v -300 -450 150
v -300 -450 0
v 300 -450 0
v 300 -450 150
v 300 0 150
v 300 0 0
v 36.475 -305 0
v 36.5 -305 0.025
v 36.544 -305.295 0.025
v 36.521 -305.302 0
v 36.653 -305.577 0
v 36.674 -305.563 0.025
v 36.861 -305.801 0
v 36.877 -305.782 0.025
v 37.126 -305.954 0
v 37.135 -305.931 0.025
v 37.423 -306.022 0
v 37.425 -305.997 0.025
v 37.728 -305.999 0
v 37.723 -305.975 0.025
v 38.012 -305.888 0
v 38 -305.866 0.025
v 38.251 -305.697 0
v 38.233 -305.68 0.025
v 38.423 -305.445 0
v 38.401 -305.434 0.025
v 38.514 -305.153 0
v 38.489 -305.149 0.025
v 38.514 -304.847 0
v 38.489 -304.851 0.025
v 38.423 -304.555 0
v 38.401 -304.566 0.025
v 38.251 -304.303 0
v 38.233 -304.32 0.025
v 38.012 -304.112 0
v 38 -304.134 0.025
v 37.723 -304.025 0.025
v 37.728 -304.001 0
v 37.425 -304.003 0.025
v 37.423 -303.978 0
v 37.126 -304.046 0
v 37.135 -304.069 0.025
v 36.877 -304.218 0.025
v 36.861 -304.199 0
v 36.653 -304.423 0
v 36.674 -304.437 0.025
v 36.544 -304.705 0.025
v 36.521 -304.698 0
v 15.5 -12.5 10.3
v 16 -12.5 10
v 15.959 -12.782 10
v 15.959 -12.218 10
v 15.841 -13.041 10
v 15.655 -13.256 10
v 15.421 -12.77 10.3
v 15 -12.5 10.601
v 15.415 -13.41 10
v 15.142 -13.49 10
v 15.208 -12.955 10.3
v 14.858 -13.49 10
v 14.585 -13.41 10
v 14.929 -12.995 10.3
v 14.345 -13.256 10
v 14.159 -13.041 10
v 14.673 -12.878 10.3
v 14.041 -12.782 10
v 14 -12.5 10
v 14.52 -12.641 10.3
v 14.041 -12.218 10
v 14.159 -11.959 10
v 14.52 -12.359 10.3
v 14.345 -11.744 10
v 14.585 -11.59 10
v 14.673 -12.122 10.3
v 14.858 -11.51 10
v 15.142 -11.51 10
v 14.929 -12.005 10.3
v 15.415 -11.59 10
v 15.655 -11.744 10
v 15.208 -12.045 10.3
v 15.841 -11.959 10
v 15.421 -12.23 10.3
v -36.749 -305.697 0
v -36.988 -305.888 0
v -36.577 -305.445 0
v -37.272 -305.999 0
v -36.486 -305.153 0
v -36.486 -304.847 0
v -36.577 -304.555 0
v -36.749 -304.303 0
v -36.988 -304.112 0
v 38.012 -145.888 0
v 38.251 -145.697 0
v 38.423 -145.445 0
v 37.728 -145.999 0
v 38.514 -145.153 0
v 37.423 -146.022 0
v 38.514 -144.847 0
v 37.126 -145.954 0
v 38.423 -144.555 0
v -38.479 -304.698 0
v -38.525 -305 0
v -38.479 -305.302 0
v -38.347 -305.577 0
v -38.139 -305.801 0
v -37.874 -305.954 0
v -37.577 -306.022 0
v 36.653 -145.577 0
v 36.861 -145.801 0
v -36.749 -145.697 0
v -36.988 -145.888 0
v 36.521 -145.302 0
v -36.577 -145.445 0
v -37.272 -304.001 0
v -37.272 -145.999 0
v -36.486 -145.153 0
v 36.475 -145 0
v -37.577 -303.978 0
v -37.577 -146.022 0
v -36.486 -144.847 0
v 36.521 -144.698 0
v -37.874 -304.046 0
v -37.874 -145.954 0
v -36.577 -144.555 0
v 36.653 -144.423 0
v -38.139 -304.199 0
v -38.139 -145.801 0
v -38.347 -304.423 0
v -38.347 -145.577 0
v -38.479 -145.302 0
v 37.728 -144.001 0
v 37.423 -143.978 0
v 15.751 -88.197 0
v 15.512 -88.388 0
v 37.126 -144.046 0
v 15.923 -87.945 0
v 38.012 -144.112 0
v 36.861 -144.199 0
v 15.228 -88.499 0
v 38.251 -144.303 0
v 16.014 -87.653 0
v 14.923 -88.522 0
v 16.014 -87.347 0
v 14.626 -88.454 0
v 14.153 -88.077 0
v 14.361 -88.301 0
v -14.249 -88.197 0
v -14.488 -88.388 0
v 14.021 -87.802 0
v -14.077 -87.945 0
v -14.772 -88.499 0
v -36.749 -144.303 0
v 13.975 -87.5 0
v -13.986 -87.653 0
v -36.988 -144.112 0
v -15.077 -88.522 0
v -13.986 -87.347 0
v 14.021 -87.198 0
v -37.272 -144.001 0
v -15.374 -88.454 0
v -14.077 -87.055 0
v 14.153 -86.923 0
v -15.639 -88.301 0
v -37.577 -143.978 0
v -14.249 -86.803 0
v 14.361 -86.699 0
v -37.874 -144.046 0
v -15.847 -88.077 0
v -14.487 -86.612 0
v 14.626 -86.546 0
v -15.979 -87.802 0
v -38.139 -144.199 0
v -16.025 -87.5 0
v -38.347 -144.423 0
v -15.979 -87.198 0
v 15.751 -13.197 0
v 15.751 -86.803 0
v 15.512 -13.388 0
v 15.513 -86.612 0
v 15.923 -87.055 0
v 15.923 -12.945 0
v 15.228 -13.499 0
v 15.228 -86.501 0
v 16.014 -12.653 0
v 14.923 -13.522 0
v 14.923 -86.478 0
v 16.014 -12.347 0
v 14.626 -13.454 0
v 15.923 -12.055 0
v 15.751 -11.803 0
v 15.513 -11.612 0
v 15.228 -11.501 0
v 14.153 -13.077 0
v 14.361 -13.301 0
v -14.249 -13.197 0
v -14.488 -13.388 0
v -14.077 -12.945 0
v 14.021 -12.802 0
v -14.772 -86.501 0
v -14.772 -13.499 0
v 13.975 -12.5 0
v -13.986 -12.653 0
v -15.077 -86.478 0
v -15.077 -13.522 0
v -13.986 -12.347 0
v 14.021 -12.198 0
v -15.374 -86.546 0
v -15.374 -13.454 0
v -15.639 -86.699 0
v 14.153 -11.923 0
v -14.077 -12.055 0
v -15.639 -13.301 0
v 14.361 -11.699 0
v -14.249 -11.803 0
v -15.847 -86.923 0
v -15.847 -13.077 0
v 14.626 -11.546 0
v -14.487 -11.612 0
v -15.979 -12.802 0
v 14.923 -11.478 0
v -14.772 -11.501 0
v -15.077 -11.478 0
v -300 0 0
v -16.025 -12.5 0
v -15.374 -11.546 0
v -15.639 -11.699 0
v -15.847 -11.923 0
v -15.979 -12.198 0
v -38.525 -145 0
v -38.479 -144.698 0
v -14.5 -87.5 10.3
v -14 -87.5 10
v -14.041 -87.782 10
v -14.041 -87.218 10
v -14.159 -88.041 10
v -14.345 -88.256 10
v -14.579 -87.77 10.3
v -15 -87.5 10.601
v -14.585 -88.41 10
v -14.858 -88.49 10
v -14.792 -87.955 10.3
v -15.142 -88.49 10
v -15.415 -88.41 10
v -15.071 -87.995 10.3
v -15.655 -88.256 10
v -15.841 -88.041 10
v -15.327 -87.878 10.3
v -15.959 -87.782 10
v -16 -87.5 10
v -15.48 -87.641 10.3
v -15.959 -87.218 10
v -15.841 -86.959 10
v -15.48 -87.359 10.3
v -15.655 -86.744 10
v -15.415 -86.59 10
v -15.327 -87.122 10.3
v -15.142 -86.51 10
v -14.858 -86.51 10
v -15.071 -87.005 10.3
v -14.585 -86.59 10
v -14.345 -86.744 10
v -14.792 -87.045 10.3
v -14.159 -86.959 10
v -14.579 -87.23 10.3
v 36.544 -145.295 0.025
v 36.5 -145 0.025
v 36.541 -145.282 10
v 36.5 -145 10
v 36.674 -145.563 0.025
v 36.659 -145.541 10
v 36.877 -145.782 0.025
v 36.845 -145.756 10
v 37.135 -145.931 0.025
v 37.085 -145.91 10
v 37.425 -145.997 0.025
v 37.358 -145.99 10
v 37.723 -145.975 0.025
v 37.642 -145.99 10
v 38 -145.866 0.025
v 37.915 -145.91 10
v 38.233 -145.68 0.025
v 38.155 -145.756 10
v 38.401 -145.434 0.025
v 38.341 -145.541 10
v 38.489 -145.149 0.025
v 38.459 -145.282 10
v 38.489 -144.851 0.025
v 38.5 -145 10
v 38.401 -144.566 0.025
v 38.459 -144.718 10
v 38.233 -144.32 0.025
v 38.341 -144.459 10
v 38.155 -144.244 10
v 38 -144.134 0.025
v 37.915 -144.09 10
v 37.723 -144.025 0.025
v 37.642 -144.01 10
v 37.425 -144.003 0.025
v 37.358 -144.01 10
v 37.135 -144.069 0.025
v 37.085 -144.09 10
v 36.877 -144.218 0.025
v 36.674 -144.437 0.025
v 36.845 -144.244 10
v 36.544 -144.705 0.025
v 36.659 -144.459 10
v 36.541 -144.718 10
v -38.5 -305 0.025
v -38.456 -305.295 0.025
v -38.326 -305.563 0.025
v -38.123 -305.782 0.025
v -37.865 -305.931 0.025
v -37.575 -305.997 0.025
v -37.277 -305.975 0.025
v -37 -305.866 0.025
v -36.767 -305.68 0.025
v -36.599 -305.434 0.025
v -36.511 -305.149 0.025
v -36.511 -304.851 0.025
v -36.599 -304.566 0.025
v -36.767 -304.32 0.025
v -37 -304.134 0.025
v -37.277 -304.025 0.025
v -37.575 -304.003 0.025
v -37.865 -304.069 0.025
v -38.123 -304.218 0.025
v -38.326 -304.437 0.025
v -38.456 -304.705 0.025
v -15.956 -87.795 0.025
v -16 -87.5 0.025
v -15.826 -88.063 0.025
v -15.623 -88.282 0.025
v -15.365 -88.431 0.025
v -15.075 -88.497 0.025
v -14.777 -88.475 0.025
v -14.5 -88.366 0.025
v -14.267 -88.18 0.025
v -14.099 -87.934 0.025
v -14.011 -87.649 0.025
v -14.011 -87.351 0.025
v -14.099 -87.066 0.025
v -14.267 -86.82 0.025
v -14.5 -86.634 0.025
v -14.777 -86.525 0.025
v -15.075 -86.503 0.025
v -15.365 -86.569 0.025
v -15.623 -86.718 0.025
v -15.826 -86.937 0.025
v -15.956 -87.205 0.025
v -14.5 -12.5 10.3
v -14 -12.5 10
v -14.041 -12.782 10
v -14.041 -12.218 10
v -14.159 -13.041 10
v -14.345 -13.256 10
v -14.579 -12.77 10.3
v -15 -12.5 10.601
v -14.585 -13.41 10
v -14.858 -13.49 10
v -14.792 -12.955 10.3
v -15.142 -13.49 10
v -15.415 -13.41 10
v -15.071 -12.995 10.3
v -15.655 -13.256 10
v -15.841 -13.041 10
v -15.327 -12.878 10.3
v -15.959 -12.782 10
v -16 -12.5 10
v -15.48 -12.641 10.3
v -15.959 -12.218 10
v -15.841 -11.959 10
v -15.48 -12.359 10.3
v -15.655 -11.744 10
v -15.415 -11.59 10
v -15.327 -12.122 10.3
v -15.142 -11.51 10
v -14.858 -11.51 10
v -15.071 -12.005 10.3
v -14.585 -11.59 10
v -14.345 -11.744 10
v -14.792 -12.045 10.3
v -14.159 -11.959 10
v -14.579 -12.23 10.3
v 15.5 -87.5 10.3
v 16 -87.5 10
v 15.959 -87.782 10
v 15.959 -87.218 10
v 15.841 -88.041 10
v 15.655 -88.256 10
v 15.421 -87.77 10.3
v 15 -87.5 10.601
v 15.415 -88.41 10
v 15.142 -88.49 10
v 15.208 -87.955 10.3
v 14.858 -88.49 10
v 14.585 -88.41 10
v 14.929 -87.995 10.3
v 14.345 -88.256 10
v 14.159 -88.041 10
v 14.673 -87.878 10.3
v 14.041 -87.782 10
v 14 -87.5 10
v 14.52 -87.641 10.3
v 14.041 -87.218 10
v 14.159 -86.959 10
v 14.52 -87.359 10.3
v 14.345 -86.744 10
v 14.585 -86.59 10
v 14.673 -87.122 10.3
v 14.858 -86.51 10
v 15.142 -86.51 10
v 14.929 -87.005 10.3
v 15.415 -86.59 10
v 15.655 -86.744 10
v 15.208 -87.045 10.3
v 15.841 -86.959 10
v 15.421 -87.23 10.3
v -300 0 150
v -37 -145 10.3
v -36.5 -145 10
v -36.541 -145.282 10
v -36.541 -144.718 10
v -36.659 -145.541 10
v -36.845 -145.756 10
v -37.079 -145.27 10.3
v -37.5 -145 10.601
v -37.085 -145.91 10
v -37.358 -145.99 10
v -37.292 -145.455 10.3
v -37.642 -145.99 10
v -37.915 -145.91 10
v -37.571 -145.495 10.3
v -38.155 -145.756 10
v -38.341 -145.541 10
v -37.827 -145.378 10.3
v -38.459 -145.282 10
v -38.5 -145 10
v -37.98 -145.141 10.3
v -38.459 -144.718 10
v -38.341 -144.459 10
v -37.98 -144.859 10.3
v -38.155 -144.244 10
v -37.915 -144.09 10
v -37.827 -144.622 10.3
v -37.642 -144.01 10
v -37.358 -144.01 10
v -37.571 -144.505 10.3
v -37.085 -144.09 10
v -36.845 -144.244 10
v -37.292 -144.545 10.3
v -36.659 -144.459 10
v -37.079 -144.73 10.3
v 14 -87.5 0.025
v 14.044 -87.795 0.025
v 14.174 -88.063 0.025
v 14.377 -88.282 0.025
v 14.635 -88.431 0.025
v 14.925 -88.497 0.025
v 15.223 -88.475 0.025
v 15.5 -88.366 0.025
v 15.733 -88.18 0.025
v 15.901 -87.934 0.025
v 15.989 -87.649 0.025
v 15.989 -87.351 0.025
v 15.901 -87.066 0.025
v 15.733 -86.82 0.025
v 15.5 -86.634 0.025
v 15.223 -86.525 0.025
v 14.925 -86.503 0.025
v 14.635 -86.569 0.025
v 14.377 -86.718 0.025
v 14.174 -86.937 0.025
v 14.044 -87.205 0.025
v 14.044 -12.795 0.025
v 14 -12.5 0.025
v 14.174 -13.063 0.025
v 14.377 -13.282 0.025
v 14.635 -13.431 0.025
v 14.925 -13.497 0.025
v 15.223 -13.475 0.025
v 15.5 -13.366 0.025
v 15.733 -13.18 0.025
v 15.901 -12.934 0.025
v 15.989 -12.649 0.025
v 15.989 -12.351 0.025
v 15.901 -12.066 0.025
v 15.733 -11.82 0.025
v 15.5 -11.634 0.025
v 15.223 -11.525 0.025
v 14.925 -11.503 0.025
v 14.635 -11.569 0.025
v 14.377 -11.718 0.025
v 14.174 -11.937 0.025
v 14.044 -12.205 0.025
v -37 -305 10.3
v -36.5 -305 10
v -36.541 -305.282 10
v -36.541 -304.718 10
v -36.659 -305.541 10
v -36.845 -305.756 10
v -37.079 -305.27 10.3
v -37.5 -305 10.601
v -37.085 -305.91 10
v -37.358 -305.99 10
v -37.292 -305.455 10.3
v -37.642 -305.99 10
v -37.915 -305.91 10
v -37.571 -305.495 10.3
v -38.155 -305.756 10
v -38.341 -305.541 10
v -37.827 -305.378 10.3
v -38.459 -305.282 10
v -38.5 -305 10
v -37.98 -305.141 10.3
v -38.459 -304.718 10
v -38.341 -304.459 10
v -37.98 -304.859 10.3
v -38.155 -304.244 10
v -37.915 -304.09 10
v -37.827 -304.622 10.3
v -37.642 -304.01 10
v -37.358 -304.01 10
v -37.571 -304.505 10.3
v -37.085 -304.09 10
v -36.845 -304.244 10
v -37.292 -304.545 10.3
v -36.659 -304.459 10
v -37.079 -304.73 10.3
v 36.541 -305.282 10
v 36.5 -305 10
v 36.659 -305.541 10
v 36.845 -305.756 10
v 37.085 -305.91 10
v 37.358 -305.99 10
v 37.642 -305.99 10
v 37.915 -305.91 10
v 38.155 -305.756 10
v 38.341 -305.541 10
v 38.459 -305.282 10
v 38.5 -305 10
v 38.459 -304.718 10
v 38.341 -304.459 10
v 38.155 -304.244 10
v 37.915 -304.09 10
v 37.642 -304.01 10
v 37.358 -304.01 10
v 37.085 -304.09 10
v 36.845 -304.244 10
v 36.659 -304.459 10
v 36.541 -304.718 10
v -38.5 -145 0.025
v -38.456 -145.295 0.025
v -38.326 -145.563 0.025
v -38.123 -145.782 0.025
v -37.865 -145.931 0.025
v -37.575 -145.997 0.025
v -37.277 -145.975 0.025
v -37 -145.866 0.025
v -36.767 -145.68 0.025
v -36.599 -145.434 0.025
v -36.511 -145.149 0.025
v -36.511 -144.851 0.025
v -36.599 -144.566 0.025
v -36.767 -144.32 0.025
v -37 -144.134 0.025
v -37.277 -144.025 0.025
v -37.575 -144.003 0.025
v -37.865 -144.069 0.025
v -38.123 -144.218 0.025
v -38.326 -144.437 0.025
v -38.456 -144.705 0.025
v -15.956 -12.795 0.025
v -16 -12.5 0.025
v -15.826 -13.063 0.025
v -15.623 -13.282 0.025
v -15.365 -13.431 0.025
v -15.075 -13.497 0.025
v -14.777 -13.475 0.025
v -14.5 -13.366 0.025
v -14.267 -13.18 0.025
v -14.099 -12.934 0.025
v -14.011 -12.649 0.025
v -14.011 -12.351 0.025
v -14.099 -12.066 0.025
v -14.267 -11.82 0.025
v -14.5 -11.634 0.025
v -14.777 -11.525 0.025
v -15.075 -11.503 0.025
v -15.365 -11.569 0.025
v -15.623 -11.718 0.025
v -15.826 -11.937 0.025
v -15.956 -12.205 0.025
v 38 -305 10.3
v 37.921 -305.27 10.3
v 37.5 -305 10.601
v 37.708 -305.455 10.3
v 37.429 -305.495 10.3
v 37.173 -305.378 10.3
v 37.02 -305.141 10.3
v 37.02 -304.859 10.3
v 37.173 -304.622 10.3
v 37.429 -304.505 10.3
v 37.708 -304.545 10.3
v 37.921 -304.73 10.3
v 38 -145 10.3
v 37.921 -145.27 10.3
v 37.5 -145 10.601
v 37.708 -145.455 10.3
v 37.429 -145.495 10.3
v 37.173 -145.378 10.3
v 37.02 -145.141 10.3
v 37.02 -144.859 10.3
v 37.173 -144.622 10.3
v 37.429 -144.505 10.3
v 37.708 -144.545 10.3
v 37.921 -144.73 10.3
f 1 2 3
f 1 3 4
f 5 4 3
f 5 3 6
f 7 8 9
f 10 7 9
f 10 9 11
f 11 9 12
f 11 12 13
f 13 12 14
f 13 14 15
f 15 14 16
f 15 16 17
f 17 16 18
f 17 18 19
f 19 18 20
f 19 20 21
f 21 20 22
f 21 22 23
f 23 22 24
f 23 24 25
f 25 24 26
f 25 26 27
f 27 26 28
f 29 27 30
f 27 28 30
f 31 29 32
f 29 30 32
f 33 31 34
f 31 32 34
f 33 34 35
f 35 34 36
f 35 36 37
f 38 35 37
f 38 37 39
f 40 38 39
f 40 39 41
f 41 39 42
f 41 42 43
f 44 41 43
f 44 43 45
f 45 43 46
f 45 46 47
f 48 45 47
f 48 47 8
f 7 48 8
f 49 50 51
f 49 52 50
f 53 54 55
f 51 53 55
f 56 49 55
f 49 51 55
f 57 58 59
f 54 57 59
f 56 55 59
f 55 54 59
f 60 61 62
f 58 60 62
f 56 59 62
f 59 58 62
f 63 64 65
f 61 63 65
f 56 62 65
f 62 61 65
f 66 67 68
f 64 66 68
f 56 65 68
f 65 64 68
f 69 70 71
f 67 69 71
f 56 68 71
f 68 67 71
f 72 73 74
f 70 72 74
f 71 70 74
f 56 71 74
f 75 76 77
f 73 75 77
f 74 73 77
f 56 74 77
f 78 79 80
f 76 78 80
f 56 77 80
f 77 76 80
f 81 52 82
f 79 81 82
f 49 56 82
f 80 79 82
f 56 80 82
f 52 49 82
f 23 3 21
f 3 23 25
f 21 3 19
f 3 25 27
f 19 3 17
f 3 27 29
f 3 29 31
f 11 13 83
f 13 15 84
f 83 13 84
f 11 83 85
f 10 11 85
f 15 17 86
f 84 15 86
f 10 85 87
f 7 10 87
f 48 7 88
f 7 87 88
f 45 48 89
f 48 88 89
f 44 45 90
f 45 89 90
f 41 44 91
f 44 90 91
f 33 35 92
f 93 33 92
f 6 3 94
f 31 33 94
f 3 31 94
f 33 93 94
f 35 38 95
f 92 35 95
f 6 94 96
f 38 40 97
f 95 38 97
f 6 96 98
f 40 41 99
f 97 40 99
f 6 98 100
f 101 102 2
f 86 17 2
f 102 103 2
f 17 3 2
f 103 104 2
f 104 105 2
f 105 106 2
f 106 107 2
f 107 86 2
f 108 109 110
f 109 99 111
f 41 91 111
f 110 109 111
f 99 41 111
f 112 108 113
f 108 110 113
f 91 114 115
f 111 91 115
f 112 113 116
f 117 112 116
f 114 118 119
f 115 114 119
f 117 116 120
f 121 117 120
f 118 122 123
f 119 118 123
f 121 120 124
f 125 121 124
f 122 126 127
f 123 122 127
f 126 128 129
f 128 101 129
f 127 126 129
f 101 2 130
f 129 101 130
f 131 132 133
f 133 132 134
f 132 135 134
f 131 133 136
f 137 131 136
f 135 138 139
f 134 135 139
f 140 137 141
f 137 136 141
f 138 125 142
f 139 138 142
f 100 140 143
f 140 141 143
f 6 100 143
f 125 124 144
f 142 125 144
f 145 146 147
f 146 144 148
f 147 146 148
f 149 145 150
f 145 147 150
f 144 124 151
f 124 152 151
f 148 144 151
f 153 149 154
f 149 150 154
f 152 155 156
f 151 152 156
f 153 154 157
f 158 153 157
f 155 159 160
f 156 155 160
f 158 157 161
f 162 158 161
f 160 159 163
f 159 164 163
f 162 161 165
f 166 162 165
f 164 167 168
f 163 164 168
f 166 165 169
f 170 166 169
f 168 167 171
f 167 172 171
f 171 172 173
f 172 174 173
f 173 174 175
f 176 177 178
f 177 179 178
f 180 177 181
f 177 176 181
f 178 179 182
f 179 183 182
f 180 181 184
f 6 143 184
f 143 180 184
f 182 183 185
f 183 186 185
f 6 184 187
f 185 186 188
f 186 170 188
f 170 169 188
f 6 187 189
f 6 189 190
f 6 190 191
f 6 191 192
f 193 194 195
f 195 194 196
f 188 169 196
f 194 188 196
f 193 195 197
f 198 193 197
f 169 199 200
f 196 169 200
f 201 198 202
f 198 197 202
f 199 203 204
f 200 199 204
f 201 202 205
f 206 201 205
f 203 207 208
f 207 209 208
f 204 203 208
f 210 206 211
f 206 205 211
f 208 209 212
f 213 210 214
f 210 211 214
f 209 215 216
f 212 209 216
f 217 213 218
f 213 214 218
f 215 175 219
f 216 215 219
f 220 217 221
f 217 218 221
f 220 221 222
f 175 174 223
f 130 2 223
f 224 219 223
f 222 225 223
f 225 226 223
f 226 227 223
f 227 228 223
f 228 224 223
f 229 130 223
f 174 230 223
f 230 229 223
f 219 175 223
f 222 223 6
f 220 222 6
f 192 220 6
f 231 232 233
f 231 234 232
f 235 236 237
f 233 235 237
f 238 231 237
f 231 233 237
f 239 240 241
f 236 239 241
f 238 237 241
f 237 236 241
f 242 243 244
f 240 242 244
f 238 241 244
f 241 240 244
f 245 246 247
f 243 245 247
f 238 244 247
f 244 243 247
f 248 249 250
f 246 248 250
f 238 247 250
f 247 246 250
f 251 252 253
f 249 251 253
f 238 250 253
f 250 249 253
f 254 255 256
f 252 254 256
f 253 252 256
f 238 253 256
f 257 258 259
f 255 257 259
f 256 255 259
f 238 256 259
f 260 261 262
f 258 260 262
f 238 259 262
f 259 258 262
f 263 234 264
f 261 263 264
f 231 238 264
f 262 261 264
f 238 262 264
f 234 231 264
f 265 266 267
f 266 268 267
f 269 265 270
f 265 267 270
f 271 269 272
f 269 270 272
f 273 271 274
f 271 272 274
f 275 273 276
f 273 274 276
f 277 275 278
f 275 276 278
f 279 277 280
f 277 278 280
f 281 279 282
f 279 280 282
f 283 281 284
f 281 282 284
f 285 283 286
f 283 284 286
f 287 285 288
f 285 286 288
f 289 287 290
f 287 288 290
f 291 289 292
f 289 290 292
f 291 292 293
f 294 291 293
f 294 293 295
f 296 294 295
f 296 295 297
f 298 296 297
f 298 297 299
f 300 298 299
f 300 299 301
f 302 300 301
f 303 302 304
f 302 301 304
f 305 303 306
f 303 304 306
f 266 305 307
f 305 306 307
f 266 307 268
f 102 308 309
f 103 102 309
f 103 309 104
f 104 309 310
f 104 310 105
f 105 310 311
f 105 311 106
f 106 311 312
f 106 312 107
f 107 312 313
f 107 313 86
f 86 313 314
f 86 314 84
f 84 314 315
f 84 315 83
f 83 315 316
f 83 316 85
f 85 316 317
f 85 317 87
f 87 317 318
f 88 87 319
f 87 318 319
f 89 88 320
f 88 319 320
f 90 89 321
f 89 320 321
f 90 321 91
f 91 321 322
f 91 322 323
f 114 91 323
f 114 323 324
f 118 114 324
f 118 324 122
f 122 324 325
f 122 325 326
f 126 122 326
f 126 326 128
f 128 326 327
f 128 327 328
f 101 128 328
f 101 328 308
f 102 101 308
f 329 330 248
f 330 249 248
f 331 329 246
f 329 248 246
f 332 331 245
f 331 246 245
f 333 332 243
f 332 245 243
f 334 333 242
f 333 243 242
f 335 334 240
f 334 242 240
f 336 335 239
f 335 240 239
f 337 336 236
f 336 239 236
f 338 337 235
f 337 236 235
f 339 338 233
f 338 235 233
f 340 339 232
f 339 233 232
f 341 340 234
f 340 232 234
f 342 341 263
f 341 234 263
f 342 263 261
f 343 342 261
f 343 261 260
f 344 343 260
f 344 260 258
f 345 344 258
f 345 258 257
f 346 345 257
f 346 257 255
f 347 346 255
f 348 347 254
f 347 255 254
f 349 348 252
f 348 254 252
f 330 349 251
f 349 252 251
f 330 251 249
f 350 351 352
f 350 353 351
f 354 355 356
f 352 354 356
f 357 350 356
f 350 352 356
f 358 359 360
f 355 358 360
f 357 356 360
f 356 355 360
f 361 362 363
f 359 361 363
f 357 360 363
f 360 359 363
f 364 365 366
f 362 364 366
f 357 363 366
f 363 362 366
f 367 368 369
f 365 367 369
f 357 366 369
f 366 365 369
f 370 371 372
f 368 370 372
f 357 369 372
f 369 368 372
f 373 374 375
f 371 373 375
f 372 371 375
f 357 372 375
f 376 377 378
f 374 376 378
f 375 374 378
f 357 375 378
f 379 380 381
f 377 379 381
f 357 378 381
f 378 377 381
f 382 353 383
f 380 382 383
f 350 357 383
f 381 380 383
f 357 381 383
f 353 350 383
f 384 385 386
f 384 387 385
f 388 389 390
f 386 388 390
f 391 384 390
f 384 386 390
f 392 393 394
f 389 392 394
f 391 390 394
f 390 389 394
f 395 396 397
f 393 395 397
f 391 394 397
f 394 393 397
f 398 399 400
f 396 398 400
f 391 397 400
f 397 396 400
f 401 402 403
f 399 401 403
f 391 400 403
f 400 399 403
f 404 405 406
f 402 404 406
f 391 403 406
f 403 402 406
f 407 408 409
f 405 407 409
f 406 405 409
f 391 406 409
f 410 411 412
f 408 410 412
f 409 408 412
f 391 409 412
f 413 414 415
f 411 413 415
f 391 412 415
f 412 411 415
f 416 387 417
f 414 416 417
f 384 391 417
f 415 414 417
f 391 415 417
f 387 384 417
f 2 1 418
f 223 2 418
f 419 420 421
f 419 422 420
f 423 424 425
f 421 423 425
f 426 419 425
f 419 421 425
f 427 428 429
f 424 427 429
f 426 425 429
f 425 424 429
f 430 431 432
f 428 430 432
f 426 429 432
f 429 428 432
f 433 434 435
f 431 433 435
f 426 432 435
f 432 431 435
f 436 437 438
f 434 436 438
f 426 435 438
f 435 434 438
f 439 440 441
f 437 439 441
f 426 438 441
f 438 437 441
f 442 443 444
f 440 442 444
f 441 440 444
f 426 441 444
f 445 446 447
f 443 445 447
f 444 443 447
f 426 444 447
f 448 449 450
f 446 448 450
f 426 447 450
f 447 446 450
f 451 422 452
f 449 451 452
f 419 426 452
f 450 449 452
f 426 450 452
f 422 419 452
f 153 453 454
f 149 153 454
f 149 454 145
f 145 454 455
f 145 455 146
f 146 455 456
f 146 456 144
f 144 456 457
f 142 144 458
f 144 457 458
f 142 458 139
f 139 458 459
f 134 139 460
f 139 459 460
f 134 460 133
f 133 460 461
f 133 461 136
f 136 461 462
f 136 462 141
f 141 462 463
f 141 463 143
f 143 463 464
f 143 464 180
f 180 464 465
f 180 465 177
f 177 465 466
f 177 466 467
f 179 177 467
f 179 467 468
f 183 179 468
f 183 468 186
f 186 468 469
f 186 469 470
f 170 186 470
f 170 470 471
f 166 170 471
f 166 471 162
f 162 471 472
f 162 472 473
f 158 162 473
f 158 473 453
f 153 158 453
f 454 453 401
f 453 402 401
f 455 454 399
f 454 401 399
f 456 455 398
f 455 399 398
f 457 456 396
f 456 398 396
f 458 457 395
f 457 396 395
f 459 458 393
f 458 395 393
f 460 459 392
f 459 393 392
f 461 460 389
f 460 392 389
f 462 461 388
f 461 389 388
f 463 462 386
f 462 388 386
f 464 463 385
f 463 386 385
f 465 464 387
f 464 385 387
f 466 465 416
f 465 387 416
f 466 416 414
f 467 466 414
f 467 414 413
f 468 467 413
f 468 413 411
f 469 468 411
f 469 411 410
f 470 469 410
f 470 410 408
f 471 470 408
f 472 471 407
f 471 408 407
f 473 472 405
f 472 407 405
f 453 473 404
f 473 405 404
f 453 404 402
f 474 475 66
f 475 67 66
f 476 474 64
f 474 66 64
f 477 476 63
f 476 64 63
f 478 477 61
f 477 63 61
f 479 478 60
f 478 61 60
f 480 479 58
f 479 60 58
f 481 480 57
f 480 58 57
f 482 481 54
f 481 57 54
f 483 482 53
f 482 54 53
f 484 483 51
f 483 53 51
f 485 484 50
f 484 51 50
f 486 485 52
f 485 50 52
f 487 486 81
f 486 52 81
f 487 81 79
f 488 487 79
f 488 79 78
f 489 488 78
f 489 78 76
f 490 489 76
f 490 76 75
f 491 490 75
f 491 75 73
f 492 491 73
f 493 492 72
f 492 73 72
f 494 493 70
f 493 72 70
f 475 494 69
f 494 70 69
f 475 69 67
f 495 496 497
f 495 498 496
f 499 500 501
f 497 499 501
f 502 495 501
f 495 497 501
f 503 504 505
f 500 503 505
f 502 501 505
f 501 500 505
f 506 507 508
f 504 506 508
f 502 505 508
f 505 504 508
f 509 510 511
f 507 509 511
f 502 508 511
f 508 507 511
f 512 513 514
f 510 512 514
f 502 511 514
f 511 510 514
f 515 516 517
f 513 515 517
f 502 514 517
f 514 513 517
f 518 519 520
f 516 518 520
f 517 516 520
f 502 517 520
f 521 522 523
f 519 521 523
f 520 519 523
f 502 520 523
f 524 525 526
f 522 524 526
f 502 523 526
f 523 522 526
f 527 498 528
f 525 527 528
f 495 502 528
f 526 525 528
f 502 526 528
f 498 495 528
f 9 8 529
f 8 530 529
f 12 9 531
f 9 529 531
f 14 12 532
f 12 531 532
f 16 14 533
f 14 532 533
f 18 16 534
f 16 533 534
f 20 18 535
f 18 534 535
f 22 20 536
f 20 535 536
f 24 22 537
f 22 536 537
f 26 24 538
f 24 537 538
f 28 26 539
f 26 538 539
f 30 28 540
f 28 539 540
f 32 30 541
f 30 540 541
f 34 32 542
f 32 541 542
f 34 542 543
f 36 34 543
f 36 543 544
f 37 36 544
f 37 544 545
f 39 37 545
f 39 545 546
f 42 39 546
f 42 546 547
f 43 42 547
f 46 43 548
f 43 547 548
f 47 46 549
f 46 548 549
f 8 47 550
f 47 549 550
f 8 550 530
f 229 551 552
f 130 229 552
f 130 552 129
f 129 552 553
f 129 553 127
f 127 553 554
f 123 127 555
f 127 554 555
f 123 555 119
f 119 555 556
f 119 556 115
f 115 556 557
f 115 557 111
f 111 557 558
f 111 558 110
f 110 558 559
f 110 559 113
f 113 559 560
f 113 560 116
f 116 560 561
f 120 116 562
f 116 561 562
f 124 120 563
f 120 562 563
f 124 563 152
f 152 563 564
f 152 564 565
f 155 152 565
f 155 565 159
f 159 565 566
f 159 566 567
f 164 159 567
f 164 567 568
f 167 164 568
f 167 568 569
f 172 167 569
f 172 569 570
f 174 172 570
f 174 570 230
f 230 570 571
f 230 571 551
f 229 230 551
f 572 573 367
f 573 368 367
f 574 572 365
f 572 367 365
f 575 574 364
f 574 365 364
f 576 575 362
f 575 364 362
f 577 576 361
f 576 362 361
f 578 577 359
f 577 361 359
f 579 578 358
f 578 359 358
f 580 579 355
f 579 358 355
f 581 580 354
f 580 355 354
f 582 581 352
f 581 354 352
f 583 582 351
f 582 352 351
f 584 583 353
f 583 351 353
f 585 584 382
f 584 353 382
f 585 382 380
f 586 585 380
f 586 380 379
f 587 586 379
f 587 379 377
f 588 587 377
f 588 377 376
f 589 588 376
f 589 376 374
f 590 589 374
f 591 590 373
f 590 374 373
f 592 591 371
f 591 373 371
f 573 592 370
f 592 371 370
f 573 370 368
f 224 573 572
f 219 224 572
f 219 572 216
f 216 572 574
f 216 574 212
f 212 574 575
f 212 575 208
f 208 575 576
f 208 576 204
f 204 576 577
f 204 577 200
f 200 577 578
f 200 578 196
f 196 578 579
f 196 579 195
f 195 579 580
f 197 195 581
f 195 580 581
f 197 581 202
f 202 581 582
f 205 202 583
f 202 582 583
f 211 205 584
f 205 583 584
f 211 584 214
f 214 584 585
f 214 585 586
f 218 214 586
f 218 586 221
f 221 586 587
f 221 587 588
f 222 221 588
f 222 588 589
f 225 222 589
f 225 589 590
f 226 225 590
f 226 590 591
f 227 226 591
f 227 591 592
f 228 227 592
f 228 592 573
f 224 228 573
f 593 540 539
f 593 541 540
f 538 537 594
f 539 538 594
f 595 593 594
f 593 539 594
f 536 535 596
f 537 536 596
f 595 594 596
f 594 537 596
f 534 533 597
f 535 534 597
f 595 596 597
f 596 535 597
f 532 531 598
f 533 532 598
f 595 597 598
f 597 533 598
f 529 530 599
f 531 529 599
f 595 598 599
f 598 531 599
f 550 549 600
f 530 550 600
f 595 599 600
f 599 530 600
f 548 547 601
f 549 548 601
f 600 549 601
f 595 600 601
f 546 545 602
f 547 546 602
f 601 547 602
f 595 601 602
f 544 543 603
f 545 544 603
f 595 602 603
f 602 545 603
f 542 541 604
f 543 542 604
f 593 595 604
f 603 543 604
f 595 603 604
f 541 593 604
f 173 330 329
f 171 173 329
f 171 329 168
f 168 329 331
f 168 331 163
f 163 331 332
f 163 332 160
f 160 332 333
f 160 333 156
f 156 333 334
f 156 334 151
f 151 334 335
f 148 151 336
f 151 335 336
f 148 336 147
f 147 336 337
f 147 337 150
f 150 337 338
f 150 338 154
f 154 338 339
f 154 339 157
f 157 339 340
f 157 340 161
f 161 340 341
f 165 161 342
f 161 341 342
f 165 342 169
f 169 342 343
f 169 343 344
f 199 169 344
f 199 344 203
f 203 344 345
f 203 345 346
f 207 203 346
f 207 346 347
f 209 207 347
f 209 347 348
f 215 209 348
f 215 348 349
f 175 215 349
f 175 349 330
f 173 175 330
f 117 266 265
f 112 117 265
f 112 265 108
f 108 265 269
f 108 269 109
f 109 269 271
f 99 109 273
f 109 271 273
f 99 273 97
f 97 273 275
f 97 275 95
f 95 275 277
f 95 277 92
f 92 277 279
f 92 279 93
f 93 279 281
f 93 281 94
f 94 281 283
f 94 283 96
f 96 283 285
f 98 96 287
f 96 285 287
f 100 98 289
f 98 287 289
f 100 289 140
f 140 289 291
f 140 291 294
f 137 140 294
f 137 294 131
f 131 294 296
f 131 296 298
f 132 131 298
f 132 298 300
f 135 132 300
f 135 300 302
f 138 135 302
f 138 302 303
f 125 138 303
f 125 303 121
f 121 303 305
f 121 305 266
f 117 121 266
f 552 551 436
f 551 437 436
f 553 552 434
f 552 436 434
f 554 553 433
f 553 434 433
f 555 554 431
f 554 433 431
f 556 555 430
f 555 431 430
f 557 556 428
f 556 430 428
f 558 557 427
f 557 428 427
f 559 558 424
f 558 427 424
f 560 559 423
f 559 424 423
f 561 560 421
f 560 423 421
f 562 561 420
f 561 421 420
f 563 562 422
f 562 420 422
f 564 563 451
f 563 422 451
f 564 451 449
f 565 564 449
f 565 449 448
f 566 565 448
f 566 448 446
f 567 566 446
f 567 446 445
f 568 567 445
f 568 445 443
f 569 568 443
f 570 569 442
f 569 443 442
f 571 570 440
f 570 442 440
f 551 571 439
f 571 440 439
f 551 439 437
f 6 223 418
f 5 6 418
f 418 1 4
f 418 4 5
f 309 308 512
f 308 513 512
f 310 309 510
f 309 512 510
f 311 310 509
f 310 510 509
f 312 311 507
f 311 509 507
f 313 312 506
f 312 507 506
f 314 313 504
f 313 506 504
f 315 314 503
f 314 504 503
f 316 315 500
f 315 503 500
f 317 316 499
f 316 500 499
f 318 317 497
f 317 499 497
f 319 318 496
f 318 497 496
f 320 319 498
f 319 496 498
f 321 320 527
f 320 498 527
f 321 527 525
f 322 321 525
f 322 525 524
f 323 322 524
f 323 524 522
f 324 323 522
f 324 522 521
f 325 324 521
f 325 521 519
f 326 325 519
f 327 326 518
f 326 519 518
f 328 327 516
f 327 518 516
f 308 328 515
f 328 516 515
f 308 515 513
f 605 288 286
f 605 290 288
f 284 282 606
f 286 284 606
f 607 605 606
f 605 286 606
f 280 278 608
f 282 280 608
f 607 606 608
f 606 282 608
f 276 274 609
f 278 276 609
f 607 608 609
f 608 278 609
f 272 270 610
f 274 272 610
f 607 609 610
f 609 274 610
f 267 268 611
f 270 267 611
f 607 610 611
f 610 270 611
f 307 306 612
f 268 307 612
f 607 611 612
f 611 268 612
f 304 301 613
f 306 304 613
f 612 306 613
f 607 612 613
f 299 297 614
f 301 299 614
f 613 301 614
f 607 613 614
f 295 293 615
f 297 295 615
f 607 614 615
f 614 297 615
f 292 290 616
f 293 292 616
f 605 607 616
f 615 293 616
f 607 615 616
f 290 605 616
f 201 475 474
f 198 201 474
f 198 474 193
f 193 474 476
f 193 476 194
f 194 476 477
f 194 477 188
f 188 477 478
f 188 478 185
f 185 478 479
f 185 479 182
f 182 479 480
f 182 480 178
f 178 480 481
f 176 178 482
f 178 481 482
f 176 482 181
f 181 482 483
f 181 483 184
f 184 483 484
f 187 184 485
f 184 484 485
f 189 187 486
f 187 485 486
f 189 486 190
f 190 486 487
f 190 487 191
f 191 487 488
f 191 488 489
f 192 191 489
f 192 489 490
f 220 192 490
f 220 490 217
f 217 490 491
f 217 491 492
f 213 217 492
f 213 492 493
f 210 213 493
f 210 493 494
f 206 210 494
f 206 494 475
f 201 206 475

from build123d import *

# Parameters (mm, degrees)
BOSS_EXTRUDE2_DEPTH             = 300
BOSS_EXTRUDE2_DEPTH_BACK        = 300
SKETCH1_W                       = 450
SKETCH1_H                       = 150
F_2_0MM_DOWEL_HOLE1_D           = 2
F_2_0MM_DOWEL_HOLE1_DEPTH       = 10
F_2_0MM_DOWEL_HOLE1_CSINK_D     = 2.05
F_2_0MM_DOWEL_HOLE1_CSINK_ANGLE = 90
F_2_0MM_DOWEL_HOLE1_TIP         = 0.600860619
F_2_0MM_DOWEL_HOLE2_D           = 2
F_2_0MM_DOWEL_HOLE2_DEPTH       = 10
F_2_0MM_DOWEL_HOLE2_CSINK_D     = 2.05
F_2_0MM_DOWEL_HOLE2_CSINK_ANGLE = 90
F_2_0MM_DOWEL_HOLE2_TIP         = 0.600860619


with BuildPart() as part:
    # Sketch1 → Boss-Extrude2 (new, two sides: drawn at the far end of the back side and taken through both)
    with BuildSketch(Plane.YZ.offset(-BOSS_EXTRUDE2_DEPTH_BACK)):
        with Locations((-225, 75)):
            Rectangle(SKETCH1_W, SKETCH1_H)
    extrude(amount=BOSS_EXTRUDE2_DEPTH + BOSS_EXTRUDE2_DEPTH_BACK)

    # Ø2.0mm Dowel Hole1
    with Locations(Plane(origin=(0, 0, 0), x_dir=(1, 0, 0), z_dir=(0, 0, -1))):
        with Locations((37.5, 145), (-37.5, 305), (-37.5, 145), (37.5, 305)):
            CounterSinkHole(F_2_0MM_DOWEL_HOLE1_D / 2, F_2_0MM_DOWEL_HOLE1_CSINK_D / 2, depth=F_2_0MM_DOWEL_HOLE1_DEPTH, counter_sink_angle=F_2_0MM_DOWEL_HOLE1_CSINK_ANGLE)
            with Locations((0, 0, -(F_2_0MM_DOWEL_HOLE1_DEPTH + F_2_0MM_DOWEL_HOLE1_TIP / 2))):  # 118° drill point
                Cone(0, F_2_0MM_DOWEL_HOLE1_D / 2, F_2_0MM_DOWEL_HOLE1_TIP, mode=Mode.SUBTRACT)

    # Ø2.0mm Dowel Hole2
    with Locations(Plane(origin=(0, 0, 0), x_dir=(1, 0, 0), z_dir=(0, 0, -1))):
        with Locations((-15, 12.5), (-15, 87.5), (15, 87.5), (15, 12.5)):
            CounterSinkHole(F_2_0MM_DOWEL_HOLE2_D / 2, F_2_0MM_DOWEL_HOLE2_CSINK_D / 2, depth=F_2_0MM_DOWEL_HOLE2_DEPTH, counter_sink_angle=F_2_0MM_DOWEL_HOLE2_CSINK_ANGLE)
            with Locations((0, 0, -(F_2_0MM_DOWEL_HOLE2_DEPTH + F_2_0MM_DOWEL_HOLE2_TIP / 2))):  # 118° drill point
                Cone(0, F_2_0MM_DOWEL_HOLE2_D / 2, F_2_0MM_DOWEL_HOLE2_TIP, mode=Mode.SUBTRACT)


solid = part.part
